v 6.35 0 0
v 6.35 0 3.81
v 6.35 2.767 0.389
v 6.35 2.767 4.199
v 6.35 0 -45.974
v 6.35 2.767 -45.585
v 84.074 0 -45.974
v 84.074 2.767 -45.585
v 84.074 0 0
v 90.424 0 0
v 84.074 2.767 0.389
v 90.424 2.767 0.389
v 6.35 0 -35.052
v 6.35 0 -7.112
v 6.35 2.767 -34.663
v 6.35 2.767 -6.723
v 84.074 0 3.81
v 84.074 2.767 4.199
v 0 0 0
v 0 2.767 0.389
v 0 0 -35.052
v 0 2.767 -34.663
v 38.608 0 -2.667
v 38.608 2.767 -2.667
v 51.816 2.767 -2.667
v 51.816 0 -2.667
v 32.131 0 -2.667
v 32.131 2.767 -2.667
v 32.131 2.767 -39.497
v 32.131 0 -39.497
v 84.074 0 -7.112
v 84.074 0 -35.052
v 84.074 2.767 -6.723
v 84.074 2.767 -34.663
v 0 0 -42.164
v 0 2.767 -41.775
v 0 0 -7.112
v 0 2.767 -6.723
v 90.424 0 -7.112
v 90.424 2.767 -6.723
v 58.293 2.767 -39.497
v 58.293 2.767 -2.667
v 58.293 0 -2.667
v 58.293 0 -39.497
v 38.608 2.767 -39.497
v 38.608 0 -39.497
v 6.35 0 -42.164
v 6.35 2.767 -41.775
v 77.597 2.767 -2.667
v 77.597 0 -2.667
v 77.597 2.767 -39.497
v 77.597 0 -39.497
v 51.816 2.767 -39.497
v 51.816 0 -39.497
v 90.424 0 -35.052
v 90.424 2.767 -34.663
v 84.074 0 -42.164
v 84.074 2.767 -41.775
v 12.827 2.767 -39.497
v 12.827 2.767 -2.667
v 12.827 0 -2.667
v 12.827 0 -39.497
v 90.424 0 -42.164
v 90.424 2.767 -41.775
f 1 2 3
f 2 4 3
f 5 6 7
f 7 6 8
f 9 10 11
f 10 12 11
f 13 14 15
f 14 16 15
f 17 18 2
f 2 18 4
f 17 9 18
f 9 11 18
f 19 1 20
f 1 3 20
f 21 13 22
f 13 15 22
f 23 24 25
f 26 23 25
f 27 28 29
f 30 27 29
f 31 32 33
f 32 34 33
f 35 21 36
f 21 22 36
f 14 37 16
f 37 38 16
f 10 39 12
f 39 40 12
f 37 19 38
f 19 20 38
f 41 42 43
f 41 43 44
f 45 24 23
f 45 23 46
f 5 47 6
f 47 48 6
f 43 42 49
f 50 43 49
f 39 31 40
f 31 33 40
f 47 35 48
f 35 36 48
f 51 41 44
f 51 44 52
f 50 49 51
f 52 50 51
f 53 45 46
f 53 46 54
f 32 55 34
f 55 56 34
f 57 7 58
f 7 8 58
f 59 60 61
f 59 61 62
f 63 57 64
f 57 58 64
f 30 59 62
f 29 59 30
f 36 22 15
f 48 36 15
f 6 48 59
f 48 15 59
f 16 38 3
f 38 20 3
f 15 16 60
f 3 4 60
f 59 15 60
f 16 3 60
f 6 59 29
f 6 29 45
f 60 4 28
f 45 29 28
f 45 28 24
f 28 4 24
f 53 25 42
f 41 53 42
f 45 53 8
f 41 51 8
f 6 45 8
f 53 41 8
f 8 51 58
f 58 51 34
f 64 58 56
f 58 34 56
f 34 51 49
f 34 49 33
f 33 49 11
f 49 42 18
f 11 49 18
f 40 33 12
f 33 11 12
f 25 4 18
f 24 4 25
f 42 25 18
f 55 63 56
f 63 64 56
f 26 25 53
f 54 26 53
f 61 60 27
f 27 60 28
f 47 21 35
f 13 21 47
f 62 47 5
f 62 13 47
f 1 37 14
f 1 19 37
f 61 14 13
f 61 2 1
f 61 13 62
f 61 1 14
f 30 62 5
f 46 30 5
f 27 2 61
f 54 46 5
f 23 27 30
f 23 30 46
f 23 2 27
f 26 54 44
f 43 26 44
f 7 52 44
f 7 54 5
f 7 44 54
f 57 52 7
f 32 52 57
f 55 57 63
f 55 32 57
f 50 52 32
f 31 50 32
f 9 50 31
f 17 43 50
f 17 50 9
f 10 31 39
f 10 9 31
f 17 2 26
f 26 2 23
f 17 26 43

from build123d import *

# Parameters (mm, degrees)
SKETCH4_W          = 13.208
SKETCH4_H          = 36.83
SKETCH4_W_2        = 19.304
CUT_EXTRUDE1_DEPTH = 7.62


with BuildPart() as part:
    # Sketch1 → Loft1 section 0
    with BuildSketch(Plane(origin=(0, 0, 0), x_dir=(1, 0, 0), z_dir=(0, 1, 0))):
        with BuildLine():
            Line((0, 7.112), (6.35, 7.112))
            Line((6.35, 7.112), (6.35, 35.052))
            Line((6.35, 35.052), (0, 35.052))
            Line((0, 35.052), (0, 42.164))
            Line((0, 42.164), (6.35, 42.164))
            Line((6.35, 42.164), (6.35, 45.974))
            Line((6.35, 45.974), (84.074, 45.974))
            Line((84.074, 45.974), (84.074, 42.164))
            Line((84.074, 42.164), (90.424, 42.164))
            Line((90.424, 42.164), (90.424, 35.052))
            Line((90.424, 35.052), (84.074, 35.052))
            Line((84.074, 35.052), (84.074, 7.112))
            Line((84.074, 7.112), (90.424, 7.112))
            Line((90.424, 7.112), (90.424, 0))
            Line((90.424, 0), (84.074, 0))
            Line((84.074, 0), (84.074, -3.81))
            Line((84.074, -3.81), (6.35, -3.81))
            Line((6.35, -3.81), (6.35, 0))
            Line((6.35, 0), (0, 0))
            Line((0, 0), (0, 7.112))
        make_face()
    # Sketch2 → Loft1 section 1
    with BuildSketch(Plane(origin=(0, 2.7667966, 0), x_dir=(1, 0, 0), z_dir=(0, 1, 0))):
        with BuildLine():
            Line((90.424, -0.3888486), (90.424, 6.7231514))
            Line((90.424, 6.7231514), (84.074, 6.7231514))
            Line((84.074, 6.7231514), (84.074, 34.6631514))
            Line((84.074, 34.6631514), (90.424, 34.6631514))
            Line((90.424, 34.6631514), (90.424, 41.7751514))
            Line((90.424, 41.7751514), (84.074, 41.7751514))
            Line((84.074, 41.7751514), (84.074, 45.5851514))
            Line((84.074, 45.5851514), (6.35, 45.5851514))
            Line((6.35, 45.5851514), (6.35, 41.7751514))
            Line((6.35, 41.7751514), (0, 41.7751514))
            Line((0, 41.7751514), (0, 34.6631514))
            Line((0, 34.6631514), (6.35, 34.6631514))
            Line((6.35, 34.6631514), (6.35, 6.7231514))
            Line((6.35, 6.7231514), (0, 6.7231514))
            Line((0, 6.7231514), (0, -0.3888486))
            Line((0, -0.3888486), (6.35, -0.3888486))
            Line((6.35, -0.3888486), (6.35, -4.1988486))
            Line((6.35, -4.1988486), (84.074, -4.1988486))
            Line((84.074, -4.1988486), (84.074, -0.3888486))
            Line((84.074, -0.3888486), (90.424, -0.3888486))
        make_face()
    loft()

    # Sketch4 → Cut-Extrude1 (cut)
    with BuildSketch(Plane(origin=(0, 2.7667966, 0), x_dir=(1, 0, 0), z_dir=(0, 1, 0))):
        with Locations((45.212, 21.082)):
            Rectangle(SKETCH4_W, SKETCH4_H)
        with Locations((22.479, 21.082)):
            Rectangle(SKETCH4_W_2, SKETCH4_H)
        with Locations((67.945, 21.082)):
            Rectangle(SKETCH4_W_2, SKETCH4_H)
    extrude(amount=-CUT_EXTRUDE1_DEPTH, mode=Mode.SUBTRACT)


solid = part.part
